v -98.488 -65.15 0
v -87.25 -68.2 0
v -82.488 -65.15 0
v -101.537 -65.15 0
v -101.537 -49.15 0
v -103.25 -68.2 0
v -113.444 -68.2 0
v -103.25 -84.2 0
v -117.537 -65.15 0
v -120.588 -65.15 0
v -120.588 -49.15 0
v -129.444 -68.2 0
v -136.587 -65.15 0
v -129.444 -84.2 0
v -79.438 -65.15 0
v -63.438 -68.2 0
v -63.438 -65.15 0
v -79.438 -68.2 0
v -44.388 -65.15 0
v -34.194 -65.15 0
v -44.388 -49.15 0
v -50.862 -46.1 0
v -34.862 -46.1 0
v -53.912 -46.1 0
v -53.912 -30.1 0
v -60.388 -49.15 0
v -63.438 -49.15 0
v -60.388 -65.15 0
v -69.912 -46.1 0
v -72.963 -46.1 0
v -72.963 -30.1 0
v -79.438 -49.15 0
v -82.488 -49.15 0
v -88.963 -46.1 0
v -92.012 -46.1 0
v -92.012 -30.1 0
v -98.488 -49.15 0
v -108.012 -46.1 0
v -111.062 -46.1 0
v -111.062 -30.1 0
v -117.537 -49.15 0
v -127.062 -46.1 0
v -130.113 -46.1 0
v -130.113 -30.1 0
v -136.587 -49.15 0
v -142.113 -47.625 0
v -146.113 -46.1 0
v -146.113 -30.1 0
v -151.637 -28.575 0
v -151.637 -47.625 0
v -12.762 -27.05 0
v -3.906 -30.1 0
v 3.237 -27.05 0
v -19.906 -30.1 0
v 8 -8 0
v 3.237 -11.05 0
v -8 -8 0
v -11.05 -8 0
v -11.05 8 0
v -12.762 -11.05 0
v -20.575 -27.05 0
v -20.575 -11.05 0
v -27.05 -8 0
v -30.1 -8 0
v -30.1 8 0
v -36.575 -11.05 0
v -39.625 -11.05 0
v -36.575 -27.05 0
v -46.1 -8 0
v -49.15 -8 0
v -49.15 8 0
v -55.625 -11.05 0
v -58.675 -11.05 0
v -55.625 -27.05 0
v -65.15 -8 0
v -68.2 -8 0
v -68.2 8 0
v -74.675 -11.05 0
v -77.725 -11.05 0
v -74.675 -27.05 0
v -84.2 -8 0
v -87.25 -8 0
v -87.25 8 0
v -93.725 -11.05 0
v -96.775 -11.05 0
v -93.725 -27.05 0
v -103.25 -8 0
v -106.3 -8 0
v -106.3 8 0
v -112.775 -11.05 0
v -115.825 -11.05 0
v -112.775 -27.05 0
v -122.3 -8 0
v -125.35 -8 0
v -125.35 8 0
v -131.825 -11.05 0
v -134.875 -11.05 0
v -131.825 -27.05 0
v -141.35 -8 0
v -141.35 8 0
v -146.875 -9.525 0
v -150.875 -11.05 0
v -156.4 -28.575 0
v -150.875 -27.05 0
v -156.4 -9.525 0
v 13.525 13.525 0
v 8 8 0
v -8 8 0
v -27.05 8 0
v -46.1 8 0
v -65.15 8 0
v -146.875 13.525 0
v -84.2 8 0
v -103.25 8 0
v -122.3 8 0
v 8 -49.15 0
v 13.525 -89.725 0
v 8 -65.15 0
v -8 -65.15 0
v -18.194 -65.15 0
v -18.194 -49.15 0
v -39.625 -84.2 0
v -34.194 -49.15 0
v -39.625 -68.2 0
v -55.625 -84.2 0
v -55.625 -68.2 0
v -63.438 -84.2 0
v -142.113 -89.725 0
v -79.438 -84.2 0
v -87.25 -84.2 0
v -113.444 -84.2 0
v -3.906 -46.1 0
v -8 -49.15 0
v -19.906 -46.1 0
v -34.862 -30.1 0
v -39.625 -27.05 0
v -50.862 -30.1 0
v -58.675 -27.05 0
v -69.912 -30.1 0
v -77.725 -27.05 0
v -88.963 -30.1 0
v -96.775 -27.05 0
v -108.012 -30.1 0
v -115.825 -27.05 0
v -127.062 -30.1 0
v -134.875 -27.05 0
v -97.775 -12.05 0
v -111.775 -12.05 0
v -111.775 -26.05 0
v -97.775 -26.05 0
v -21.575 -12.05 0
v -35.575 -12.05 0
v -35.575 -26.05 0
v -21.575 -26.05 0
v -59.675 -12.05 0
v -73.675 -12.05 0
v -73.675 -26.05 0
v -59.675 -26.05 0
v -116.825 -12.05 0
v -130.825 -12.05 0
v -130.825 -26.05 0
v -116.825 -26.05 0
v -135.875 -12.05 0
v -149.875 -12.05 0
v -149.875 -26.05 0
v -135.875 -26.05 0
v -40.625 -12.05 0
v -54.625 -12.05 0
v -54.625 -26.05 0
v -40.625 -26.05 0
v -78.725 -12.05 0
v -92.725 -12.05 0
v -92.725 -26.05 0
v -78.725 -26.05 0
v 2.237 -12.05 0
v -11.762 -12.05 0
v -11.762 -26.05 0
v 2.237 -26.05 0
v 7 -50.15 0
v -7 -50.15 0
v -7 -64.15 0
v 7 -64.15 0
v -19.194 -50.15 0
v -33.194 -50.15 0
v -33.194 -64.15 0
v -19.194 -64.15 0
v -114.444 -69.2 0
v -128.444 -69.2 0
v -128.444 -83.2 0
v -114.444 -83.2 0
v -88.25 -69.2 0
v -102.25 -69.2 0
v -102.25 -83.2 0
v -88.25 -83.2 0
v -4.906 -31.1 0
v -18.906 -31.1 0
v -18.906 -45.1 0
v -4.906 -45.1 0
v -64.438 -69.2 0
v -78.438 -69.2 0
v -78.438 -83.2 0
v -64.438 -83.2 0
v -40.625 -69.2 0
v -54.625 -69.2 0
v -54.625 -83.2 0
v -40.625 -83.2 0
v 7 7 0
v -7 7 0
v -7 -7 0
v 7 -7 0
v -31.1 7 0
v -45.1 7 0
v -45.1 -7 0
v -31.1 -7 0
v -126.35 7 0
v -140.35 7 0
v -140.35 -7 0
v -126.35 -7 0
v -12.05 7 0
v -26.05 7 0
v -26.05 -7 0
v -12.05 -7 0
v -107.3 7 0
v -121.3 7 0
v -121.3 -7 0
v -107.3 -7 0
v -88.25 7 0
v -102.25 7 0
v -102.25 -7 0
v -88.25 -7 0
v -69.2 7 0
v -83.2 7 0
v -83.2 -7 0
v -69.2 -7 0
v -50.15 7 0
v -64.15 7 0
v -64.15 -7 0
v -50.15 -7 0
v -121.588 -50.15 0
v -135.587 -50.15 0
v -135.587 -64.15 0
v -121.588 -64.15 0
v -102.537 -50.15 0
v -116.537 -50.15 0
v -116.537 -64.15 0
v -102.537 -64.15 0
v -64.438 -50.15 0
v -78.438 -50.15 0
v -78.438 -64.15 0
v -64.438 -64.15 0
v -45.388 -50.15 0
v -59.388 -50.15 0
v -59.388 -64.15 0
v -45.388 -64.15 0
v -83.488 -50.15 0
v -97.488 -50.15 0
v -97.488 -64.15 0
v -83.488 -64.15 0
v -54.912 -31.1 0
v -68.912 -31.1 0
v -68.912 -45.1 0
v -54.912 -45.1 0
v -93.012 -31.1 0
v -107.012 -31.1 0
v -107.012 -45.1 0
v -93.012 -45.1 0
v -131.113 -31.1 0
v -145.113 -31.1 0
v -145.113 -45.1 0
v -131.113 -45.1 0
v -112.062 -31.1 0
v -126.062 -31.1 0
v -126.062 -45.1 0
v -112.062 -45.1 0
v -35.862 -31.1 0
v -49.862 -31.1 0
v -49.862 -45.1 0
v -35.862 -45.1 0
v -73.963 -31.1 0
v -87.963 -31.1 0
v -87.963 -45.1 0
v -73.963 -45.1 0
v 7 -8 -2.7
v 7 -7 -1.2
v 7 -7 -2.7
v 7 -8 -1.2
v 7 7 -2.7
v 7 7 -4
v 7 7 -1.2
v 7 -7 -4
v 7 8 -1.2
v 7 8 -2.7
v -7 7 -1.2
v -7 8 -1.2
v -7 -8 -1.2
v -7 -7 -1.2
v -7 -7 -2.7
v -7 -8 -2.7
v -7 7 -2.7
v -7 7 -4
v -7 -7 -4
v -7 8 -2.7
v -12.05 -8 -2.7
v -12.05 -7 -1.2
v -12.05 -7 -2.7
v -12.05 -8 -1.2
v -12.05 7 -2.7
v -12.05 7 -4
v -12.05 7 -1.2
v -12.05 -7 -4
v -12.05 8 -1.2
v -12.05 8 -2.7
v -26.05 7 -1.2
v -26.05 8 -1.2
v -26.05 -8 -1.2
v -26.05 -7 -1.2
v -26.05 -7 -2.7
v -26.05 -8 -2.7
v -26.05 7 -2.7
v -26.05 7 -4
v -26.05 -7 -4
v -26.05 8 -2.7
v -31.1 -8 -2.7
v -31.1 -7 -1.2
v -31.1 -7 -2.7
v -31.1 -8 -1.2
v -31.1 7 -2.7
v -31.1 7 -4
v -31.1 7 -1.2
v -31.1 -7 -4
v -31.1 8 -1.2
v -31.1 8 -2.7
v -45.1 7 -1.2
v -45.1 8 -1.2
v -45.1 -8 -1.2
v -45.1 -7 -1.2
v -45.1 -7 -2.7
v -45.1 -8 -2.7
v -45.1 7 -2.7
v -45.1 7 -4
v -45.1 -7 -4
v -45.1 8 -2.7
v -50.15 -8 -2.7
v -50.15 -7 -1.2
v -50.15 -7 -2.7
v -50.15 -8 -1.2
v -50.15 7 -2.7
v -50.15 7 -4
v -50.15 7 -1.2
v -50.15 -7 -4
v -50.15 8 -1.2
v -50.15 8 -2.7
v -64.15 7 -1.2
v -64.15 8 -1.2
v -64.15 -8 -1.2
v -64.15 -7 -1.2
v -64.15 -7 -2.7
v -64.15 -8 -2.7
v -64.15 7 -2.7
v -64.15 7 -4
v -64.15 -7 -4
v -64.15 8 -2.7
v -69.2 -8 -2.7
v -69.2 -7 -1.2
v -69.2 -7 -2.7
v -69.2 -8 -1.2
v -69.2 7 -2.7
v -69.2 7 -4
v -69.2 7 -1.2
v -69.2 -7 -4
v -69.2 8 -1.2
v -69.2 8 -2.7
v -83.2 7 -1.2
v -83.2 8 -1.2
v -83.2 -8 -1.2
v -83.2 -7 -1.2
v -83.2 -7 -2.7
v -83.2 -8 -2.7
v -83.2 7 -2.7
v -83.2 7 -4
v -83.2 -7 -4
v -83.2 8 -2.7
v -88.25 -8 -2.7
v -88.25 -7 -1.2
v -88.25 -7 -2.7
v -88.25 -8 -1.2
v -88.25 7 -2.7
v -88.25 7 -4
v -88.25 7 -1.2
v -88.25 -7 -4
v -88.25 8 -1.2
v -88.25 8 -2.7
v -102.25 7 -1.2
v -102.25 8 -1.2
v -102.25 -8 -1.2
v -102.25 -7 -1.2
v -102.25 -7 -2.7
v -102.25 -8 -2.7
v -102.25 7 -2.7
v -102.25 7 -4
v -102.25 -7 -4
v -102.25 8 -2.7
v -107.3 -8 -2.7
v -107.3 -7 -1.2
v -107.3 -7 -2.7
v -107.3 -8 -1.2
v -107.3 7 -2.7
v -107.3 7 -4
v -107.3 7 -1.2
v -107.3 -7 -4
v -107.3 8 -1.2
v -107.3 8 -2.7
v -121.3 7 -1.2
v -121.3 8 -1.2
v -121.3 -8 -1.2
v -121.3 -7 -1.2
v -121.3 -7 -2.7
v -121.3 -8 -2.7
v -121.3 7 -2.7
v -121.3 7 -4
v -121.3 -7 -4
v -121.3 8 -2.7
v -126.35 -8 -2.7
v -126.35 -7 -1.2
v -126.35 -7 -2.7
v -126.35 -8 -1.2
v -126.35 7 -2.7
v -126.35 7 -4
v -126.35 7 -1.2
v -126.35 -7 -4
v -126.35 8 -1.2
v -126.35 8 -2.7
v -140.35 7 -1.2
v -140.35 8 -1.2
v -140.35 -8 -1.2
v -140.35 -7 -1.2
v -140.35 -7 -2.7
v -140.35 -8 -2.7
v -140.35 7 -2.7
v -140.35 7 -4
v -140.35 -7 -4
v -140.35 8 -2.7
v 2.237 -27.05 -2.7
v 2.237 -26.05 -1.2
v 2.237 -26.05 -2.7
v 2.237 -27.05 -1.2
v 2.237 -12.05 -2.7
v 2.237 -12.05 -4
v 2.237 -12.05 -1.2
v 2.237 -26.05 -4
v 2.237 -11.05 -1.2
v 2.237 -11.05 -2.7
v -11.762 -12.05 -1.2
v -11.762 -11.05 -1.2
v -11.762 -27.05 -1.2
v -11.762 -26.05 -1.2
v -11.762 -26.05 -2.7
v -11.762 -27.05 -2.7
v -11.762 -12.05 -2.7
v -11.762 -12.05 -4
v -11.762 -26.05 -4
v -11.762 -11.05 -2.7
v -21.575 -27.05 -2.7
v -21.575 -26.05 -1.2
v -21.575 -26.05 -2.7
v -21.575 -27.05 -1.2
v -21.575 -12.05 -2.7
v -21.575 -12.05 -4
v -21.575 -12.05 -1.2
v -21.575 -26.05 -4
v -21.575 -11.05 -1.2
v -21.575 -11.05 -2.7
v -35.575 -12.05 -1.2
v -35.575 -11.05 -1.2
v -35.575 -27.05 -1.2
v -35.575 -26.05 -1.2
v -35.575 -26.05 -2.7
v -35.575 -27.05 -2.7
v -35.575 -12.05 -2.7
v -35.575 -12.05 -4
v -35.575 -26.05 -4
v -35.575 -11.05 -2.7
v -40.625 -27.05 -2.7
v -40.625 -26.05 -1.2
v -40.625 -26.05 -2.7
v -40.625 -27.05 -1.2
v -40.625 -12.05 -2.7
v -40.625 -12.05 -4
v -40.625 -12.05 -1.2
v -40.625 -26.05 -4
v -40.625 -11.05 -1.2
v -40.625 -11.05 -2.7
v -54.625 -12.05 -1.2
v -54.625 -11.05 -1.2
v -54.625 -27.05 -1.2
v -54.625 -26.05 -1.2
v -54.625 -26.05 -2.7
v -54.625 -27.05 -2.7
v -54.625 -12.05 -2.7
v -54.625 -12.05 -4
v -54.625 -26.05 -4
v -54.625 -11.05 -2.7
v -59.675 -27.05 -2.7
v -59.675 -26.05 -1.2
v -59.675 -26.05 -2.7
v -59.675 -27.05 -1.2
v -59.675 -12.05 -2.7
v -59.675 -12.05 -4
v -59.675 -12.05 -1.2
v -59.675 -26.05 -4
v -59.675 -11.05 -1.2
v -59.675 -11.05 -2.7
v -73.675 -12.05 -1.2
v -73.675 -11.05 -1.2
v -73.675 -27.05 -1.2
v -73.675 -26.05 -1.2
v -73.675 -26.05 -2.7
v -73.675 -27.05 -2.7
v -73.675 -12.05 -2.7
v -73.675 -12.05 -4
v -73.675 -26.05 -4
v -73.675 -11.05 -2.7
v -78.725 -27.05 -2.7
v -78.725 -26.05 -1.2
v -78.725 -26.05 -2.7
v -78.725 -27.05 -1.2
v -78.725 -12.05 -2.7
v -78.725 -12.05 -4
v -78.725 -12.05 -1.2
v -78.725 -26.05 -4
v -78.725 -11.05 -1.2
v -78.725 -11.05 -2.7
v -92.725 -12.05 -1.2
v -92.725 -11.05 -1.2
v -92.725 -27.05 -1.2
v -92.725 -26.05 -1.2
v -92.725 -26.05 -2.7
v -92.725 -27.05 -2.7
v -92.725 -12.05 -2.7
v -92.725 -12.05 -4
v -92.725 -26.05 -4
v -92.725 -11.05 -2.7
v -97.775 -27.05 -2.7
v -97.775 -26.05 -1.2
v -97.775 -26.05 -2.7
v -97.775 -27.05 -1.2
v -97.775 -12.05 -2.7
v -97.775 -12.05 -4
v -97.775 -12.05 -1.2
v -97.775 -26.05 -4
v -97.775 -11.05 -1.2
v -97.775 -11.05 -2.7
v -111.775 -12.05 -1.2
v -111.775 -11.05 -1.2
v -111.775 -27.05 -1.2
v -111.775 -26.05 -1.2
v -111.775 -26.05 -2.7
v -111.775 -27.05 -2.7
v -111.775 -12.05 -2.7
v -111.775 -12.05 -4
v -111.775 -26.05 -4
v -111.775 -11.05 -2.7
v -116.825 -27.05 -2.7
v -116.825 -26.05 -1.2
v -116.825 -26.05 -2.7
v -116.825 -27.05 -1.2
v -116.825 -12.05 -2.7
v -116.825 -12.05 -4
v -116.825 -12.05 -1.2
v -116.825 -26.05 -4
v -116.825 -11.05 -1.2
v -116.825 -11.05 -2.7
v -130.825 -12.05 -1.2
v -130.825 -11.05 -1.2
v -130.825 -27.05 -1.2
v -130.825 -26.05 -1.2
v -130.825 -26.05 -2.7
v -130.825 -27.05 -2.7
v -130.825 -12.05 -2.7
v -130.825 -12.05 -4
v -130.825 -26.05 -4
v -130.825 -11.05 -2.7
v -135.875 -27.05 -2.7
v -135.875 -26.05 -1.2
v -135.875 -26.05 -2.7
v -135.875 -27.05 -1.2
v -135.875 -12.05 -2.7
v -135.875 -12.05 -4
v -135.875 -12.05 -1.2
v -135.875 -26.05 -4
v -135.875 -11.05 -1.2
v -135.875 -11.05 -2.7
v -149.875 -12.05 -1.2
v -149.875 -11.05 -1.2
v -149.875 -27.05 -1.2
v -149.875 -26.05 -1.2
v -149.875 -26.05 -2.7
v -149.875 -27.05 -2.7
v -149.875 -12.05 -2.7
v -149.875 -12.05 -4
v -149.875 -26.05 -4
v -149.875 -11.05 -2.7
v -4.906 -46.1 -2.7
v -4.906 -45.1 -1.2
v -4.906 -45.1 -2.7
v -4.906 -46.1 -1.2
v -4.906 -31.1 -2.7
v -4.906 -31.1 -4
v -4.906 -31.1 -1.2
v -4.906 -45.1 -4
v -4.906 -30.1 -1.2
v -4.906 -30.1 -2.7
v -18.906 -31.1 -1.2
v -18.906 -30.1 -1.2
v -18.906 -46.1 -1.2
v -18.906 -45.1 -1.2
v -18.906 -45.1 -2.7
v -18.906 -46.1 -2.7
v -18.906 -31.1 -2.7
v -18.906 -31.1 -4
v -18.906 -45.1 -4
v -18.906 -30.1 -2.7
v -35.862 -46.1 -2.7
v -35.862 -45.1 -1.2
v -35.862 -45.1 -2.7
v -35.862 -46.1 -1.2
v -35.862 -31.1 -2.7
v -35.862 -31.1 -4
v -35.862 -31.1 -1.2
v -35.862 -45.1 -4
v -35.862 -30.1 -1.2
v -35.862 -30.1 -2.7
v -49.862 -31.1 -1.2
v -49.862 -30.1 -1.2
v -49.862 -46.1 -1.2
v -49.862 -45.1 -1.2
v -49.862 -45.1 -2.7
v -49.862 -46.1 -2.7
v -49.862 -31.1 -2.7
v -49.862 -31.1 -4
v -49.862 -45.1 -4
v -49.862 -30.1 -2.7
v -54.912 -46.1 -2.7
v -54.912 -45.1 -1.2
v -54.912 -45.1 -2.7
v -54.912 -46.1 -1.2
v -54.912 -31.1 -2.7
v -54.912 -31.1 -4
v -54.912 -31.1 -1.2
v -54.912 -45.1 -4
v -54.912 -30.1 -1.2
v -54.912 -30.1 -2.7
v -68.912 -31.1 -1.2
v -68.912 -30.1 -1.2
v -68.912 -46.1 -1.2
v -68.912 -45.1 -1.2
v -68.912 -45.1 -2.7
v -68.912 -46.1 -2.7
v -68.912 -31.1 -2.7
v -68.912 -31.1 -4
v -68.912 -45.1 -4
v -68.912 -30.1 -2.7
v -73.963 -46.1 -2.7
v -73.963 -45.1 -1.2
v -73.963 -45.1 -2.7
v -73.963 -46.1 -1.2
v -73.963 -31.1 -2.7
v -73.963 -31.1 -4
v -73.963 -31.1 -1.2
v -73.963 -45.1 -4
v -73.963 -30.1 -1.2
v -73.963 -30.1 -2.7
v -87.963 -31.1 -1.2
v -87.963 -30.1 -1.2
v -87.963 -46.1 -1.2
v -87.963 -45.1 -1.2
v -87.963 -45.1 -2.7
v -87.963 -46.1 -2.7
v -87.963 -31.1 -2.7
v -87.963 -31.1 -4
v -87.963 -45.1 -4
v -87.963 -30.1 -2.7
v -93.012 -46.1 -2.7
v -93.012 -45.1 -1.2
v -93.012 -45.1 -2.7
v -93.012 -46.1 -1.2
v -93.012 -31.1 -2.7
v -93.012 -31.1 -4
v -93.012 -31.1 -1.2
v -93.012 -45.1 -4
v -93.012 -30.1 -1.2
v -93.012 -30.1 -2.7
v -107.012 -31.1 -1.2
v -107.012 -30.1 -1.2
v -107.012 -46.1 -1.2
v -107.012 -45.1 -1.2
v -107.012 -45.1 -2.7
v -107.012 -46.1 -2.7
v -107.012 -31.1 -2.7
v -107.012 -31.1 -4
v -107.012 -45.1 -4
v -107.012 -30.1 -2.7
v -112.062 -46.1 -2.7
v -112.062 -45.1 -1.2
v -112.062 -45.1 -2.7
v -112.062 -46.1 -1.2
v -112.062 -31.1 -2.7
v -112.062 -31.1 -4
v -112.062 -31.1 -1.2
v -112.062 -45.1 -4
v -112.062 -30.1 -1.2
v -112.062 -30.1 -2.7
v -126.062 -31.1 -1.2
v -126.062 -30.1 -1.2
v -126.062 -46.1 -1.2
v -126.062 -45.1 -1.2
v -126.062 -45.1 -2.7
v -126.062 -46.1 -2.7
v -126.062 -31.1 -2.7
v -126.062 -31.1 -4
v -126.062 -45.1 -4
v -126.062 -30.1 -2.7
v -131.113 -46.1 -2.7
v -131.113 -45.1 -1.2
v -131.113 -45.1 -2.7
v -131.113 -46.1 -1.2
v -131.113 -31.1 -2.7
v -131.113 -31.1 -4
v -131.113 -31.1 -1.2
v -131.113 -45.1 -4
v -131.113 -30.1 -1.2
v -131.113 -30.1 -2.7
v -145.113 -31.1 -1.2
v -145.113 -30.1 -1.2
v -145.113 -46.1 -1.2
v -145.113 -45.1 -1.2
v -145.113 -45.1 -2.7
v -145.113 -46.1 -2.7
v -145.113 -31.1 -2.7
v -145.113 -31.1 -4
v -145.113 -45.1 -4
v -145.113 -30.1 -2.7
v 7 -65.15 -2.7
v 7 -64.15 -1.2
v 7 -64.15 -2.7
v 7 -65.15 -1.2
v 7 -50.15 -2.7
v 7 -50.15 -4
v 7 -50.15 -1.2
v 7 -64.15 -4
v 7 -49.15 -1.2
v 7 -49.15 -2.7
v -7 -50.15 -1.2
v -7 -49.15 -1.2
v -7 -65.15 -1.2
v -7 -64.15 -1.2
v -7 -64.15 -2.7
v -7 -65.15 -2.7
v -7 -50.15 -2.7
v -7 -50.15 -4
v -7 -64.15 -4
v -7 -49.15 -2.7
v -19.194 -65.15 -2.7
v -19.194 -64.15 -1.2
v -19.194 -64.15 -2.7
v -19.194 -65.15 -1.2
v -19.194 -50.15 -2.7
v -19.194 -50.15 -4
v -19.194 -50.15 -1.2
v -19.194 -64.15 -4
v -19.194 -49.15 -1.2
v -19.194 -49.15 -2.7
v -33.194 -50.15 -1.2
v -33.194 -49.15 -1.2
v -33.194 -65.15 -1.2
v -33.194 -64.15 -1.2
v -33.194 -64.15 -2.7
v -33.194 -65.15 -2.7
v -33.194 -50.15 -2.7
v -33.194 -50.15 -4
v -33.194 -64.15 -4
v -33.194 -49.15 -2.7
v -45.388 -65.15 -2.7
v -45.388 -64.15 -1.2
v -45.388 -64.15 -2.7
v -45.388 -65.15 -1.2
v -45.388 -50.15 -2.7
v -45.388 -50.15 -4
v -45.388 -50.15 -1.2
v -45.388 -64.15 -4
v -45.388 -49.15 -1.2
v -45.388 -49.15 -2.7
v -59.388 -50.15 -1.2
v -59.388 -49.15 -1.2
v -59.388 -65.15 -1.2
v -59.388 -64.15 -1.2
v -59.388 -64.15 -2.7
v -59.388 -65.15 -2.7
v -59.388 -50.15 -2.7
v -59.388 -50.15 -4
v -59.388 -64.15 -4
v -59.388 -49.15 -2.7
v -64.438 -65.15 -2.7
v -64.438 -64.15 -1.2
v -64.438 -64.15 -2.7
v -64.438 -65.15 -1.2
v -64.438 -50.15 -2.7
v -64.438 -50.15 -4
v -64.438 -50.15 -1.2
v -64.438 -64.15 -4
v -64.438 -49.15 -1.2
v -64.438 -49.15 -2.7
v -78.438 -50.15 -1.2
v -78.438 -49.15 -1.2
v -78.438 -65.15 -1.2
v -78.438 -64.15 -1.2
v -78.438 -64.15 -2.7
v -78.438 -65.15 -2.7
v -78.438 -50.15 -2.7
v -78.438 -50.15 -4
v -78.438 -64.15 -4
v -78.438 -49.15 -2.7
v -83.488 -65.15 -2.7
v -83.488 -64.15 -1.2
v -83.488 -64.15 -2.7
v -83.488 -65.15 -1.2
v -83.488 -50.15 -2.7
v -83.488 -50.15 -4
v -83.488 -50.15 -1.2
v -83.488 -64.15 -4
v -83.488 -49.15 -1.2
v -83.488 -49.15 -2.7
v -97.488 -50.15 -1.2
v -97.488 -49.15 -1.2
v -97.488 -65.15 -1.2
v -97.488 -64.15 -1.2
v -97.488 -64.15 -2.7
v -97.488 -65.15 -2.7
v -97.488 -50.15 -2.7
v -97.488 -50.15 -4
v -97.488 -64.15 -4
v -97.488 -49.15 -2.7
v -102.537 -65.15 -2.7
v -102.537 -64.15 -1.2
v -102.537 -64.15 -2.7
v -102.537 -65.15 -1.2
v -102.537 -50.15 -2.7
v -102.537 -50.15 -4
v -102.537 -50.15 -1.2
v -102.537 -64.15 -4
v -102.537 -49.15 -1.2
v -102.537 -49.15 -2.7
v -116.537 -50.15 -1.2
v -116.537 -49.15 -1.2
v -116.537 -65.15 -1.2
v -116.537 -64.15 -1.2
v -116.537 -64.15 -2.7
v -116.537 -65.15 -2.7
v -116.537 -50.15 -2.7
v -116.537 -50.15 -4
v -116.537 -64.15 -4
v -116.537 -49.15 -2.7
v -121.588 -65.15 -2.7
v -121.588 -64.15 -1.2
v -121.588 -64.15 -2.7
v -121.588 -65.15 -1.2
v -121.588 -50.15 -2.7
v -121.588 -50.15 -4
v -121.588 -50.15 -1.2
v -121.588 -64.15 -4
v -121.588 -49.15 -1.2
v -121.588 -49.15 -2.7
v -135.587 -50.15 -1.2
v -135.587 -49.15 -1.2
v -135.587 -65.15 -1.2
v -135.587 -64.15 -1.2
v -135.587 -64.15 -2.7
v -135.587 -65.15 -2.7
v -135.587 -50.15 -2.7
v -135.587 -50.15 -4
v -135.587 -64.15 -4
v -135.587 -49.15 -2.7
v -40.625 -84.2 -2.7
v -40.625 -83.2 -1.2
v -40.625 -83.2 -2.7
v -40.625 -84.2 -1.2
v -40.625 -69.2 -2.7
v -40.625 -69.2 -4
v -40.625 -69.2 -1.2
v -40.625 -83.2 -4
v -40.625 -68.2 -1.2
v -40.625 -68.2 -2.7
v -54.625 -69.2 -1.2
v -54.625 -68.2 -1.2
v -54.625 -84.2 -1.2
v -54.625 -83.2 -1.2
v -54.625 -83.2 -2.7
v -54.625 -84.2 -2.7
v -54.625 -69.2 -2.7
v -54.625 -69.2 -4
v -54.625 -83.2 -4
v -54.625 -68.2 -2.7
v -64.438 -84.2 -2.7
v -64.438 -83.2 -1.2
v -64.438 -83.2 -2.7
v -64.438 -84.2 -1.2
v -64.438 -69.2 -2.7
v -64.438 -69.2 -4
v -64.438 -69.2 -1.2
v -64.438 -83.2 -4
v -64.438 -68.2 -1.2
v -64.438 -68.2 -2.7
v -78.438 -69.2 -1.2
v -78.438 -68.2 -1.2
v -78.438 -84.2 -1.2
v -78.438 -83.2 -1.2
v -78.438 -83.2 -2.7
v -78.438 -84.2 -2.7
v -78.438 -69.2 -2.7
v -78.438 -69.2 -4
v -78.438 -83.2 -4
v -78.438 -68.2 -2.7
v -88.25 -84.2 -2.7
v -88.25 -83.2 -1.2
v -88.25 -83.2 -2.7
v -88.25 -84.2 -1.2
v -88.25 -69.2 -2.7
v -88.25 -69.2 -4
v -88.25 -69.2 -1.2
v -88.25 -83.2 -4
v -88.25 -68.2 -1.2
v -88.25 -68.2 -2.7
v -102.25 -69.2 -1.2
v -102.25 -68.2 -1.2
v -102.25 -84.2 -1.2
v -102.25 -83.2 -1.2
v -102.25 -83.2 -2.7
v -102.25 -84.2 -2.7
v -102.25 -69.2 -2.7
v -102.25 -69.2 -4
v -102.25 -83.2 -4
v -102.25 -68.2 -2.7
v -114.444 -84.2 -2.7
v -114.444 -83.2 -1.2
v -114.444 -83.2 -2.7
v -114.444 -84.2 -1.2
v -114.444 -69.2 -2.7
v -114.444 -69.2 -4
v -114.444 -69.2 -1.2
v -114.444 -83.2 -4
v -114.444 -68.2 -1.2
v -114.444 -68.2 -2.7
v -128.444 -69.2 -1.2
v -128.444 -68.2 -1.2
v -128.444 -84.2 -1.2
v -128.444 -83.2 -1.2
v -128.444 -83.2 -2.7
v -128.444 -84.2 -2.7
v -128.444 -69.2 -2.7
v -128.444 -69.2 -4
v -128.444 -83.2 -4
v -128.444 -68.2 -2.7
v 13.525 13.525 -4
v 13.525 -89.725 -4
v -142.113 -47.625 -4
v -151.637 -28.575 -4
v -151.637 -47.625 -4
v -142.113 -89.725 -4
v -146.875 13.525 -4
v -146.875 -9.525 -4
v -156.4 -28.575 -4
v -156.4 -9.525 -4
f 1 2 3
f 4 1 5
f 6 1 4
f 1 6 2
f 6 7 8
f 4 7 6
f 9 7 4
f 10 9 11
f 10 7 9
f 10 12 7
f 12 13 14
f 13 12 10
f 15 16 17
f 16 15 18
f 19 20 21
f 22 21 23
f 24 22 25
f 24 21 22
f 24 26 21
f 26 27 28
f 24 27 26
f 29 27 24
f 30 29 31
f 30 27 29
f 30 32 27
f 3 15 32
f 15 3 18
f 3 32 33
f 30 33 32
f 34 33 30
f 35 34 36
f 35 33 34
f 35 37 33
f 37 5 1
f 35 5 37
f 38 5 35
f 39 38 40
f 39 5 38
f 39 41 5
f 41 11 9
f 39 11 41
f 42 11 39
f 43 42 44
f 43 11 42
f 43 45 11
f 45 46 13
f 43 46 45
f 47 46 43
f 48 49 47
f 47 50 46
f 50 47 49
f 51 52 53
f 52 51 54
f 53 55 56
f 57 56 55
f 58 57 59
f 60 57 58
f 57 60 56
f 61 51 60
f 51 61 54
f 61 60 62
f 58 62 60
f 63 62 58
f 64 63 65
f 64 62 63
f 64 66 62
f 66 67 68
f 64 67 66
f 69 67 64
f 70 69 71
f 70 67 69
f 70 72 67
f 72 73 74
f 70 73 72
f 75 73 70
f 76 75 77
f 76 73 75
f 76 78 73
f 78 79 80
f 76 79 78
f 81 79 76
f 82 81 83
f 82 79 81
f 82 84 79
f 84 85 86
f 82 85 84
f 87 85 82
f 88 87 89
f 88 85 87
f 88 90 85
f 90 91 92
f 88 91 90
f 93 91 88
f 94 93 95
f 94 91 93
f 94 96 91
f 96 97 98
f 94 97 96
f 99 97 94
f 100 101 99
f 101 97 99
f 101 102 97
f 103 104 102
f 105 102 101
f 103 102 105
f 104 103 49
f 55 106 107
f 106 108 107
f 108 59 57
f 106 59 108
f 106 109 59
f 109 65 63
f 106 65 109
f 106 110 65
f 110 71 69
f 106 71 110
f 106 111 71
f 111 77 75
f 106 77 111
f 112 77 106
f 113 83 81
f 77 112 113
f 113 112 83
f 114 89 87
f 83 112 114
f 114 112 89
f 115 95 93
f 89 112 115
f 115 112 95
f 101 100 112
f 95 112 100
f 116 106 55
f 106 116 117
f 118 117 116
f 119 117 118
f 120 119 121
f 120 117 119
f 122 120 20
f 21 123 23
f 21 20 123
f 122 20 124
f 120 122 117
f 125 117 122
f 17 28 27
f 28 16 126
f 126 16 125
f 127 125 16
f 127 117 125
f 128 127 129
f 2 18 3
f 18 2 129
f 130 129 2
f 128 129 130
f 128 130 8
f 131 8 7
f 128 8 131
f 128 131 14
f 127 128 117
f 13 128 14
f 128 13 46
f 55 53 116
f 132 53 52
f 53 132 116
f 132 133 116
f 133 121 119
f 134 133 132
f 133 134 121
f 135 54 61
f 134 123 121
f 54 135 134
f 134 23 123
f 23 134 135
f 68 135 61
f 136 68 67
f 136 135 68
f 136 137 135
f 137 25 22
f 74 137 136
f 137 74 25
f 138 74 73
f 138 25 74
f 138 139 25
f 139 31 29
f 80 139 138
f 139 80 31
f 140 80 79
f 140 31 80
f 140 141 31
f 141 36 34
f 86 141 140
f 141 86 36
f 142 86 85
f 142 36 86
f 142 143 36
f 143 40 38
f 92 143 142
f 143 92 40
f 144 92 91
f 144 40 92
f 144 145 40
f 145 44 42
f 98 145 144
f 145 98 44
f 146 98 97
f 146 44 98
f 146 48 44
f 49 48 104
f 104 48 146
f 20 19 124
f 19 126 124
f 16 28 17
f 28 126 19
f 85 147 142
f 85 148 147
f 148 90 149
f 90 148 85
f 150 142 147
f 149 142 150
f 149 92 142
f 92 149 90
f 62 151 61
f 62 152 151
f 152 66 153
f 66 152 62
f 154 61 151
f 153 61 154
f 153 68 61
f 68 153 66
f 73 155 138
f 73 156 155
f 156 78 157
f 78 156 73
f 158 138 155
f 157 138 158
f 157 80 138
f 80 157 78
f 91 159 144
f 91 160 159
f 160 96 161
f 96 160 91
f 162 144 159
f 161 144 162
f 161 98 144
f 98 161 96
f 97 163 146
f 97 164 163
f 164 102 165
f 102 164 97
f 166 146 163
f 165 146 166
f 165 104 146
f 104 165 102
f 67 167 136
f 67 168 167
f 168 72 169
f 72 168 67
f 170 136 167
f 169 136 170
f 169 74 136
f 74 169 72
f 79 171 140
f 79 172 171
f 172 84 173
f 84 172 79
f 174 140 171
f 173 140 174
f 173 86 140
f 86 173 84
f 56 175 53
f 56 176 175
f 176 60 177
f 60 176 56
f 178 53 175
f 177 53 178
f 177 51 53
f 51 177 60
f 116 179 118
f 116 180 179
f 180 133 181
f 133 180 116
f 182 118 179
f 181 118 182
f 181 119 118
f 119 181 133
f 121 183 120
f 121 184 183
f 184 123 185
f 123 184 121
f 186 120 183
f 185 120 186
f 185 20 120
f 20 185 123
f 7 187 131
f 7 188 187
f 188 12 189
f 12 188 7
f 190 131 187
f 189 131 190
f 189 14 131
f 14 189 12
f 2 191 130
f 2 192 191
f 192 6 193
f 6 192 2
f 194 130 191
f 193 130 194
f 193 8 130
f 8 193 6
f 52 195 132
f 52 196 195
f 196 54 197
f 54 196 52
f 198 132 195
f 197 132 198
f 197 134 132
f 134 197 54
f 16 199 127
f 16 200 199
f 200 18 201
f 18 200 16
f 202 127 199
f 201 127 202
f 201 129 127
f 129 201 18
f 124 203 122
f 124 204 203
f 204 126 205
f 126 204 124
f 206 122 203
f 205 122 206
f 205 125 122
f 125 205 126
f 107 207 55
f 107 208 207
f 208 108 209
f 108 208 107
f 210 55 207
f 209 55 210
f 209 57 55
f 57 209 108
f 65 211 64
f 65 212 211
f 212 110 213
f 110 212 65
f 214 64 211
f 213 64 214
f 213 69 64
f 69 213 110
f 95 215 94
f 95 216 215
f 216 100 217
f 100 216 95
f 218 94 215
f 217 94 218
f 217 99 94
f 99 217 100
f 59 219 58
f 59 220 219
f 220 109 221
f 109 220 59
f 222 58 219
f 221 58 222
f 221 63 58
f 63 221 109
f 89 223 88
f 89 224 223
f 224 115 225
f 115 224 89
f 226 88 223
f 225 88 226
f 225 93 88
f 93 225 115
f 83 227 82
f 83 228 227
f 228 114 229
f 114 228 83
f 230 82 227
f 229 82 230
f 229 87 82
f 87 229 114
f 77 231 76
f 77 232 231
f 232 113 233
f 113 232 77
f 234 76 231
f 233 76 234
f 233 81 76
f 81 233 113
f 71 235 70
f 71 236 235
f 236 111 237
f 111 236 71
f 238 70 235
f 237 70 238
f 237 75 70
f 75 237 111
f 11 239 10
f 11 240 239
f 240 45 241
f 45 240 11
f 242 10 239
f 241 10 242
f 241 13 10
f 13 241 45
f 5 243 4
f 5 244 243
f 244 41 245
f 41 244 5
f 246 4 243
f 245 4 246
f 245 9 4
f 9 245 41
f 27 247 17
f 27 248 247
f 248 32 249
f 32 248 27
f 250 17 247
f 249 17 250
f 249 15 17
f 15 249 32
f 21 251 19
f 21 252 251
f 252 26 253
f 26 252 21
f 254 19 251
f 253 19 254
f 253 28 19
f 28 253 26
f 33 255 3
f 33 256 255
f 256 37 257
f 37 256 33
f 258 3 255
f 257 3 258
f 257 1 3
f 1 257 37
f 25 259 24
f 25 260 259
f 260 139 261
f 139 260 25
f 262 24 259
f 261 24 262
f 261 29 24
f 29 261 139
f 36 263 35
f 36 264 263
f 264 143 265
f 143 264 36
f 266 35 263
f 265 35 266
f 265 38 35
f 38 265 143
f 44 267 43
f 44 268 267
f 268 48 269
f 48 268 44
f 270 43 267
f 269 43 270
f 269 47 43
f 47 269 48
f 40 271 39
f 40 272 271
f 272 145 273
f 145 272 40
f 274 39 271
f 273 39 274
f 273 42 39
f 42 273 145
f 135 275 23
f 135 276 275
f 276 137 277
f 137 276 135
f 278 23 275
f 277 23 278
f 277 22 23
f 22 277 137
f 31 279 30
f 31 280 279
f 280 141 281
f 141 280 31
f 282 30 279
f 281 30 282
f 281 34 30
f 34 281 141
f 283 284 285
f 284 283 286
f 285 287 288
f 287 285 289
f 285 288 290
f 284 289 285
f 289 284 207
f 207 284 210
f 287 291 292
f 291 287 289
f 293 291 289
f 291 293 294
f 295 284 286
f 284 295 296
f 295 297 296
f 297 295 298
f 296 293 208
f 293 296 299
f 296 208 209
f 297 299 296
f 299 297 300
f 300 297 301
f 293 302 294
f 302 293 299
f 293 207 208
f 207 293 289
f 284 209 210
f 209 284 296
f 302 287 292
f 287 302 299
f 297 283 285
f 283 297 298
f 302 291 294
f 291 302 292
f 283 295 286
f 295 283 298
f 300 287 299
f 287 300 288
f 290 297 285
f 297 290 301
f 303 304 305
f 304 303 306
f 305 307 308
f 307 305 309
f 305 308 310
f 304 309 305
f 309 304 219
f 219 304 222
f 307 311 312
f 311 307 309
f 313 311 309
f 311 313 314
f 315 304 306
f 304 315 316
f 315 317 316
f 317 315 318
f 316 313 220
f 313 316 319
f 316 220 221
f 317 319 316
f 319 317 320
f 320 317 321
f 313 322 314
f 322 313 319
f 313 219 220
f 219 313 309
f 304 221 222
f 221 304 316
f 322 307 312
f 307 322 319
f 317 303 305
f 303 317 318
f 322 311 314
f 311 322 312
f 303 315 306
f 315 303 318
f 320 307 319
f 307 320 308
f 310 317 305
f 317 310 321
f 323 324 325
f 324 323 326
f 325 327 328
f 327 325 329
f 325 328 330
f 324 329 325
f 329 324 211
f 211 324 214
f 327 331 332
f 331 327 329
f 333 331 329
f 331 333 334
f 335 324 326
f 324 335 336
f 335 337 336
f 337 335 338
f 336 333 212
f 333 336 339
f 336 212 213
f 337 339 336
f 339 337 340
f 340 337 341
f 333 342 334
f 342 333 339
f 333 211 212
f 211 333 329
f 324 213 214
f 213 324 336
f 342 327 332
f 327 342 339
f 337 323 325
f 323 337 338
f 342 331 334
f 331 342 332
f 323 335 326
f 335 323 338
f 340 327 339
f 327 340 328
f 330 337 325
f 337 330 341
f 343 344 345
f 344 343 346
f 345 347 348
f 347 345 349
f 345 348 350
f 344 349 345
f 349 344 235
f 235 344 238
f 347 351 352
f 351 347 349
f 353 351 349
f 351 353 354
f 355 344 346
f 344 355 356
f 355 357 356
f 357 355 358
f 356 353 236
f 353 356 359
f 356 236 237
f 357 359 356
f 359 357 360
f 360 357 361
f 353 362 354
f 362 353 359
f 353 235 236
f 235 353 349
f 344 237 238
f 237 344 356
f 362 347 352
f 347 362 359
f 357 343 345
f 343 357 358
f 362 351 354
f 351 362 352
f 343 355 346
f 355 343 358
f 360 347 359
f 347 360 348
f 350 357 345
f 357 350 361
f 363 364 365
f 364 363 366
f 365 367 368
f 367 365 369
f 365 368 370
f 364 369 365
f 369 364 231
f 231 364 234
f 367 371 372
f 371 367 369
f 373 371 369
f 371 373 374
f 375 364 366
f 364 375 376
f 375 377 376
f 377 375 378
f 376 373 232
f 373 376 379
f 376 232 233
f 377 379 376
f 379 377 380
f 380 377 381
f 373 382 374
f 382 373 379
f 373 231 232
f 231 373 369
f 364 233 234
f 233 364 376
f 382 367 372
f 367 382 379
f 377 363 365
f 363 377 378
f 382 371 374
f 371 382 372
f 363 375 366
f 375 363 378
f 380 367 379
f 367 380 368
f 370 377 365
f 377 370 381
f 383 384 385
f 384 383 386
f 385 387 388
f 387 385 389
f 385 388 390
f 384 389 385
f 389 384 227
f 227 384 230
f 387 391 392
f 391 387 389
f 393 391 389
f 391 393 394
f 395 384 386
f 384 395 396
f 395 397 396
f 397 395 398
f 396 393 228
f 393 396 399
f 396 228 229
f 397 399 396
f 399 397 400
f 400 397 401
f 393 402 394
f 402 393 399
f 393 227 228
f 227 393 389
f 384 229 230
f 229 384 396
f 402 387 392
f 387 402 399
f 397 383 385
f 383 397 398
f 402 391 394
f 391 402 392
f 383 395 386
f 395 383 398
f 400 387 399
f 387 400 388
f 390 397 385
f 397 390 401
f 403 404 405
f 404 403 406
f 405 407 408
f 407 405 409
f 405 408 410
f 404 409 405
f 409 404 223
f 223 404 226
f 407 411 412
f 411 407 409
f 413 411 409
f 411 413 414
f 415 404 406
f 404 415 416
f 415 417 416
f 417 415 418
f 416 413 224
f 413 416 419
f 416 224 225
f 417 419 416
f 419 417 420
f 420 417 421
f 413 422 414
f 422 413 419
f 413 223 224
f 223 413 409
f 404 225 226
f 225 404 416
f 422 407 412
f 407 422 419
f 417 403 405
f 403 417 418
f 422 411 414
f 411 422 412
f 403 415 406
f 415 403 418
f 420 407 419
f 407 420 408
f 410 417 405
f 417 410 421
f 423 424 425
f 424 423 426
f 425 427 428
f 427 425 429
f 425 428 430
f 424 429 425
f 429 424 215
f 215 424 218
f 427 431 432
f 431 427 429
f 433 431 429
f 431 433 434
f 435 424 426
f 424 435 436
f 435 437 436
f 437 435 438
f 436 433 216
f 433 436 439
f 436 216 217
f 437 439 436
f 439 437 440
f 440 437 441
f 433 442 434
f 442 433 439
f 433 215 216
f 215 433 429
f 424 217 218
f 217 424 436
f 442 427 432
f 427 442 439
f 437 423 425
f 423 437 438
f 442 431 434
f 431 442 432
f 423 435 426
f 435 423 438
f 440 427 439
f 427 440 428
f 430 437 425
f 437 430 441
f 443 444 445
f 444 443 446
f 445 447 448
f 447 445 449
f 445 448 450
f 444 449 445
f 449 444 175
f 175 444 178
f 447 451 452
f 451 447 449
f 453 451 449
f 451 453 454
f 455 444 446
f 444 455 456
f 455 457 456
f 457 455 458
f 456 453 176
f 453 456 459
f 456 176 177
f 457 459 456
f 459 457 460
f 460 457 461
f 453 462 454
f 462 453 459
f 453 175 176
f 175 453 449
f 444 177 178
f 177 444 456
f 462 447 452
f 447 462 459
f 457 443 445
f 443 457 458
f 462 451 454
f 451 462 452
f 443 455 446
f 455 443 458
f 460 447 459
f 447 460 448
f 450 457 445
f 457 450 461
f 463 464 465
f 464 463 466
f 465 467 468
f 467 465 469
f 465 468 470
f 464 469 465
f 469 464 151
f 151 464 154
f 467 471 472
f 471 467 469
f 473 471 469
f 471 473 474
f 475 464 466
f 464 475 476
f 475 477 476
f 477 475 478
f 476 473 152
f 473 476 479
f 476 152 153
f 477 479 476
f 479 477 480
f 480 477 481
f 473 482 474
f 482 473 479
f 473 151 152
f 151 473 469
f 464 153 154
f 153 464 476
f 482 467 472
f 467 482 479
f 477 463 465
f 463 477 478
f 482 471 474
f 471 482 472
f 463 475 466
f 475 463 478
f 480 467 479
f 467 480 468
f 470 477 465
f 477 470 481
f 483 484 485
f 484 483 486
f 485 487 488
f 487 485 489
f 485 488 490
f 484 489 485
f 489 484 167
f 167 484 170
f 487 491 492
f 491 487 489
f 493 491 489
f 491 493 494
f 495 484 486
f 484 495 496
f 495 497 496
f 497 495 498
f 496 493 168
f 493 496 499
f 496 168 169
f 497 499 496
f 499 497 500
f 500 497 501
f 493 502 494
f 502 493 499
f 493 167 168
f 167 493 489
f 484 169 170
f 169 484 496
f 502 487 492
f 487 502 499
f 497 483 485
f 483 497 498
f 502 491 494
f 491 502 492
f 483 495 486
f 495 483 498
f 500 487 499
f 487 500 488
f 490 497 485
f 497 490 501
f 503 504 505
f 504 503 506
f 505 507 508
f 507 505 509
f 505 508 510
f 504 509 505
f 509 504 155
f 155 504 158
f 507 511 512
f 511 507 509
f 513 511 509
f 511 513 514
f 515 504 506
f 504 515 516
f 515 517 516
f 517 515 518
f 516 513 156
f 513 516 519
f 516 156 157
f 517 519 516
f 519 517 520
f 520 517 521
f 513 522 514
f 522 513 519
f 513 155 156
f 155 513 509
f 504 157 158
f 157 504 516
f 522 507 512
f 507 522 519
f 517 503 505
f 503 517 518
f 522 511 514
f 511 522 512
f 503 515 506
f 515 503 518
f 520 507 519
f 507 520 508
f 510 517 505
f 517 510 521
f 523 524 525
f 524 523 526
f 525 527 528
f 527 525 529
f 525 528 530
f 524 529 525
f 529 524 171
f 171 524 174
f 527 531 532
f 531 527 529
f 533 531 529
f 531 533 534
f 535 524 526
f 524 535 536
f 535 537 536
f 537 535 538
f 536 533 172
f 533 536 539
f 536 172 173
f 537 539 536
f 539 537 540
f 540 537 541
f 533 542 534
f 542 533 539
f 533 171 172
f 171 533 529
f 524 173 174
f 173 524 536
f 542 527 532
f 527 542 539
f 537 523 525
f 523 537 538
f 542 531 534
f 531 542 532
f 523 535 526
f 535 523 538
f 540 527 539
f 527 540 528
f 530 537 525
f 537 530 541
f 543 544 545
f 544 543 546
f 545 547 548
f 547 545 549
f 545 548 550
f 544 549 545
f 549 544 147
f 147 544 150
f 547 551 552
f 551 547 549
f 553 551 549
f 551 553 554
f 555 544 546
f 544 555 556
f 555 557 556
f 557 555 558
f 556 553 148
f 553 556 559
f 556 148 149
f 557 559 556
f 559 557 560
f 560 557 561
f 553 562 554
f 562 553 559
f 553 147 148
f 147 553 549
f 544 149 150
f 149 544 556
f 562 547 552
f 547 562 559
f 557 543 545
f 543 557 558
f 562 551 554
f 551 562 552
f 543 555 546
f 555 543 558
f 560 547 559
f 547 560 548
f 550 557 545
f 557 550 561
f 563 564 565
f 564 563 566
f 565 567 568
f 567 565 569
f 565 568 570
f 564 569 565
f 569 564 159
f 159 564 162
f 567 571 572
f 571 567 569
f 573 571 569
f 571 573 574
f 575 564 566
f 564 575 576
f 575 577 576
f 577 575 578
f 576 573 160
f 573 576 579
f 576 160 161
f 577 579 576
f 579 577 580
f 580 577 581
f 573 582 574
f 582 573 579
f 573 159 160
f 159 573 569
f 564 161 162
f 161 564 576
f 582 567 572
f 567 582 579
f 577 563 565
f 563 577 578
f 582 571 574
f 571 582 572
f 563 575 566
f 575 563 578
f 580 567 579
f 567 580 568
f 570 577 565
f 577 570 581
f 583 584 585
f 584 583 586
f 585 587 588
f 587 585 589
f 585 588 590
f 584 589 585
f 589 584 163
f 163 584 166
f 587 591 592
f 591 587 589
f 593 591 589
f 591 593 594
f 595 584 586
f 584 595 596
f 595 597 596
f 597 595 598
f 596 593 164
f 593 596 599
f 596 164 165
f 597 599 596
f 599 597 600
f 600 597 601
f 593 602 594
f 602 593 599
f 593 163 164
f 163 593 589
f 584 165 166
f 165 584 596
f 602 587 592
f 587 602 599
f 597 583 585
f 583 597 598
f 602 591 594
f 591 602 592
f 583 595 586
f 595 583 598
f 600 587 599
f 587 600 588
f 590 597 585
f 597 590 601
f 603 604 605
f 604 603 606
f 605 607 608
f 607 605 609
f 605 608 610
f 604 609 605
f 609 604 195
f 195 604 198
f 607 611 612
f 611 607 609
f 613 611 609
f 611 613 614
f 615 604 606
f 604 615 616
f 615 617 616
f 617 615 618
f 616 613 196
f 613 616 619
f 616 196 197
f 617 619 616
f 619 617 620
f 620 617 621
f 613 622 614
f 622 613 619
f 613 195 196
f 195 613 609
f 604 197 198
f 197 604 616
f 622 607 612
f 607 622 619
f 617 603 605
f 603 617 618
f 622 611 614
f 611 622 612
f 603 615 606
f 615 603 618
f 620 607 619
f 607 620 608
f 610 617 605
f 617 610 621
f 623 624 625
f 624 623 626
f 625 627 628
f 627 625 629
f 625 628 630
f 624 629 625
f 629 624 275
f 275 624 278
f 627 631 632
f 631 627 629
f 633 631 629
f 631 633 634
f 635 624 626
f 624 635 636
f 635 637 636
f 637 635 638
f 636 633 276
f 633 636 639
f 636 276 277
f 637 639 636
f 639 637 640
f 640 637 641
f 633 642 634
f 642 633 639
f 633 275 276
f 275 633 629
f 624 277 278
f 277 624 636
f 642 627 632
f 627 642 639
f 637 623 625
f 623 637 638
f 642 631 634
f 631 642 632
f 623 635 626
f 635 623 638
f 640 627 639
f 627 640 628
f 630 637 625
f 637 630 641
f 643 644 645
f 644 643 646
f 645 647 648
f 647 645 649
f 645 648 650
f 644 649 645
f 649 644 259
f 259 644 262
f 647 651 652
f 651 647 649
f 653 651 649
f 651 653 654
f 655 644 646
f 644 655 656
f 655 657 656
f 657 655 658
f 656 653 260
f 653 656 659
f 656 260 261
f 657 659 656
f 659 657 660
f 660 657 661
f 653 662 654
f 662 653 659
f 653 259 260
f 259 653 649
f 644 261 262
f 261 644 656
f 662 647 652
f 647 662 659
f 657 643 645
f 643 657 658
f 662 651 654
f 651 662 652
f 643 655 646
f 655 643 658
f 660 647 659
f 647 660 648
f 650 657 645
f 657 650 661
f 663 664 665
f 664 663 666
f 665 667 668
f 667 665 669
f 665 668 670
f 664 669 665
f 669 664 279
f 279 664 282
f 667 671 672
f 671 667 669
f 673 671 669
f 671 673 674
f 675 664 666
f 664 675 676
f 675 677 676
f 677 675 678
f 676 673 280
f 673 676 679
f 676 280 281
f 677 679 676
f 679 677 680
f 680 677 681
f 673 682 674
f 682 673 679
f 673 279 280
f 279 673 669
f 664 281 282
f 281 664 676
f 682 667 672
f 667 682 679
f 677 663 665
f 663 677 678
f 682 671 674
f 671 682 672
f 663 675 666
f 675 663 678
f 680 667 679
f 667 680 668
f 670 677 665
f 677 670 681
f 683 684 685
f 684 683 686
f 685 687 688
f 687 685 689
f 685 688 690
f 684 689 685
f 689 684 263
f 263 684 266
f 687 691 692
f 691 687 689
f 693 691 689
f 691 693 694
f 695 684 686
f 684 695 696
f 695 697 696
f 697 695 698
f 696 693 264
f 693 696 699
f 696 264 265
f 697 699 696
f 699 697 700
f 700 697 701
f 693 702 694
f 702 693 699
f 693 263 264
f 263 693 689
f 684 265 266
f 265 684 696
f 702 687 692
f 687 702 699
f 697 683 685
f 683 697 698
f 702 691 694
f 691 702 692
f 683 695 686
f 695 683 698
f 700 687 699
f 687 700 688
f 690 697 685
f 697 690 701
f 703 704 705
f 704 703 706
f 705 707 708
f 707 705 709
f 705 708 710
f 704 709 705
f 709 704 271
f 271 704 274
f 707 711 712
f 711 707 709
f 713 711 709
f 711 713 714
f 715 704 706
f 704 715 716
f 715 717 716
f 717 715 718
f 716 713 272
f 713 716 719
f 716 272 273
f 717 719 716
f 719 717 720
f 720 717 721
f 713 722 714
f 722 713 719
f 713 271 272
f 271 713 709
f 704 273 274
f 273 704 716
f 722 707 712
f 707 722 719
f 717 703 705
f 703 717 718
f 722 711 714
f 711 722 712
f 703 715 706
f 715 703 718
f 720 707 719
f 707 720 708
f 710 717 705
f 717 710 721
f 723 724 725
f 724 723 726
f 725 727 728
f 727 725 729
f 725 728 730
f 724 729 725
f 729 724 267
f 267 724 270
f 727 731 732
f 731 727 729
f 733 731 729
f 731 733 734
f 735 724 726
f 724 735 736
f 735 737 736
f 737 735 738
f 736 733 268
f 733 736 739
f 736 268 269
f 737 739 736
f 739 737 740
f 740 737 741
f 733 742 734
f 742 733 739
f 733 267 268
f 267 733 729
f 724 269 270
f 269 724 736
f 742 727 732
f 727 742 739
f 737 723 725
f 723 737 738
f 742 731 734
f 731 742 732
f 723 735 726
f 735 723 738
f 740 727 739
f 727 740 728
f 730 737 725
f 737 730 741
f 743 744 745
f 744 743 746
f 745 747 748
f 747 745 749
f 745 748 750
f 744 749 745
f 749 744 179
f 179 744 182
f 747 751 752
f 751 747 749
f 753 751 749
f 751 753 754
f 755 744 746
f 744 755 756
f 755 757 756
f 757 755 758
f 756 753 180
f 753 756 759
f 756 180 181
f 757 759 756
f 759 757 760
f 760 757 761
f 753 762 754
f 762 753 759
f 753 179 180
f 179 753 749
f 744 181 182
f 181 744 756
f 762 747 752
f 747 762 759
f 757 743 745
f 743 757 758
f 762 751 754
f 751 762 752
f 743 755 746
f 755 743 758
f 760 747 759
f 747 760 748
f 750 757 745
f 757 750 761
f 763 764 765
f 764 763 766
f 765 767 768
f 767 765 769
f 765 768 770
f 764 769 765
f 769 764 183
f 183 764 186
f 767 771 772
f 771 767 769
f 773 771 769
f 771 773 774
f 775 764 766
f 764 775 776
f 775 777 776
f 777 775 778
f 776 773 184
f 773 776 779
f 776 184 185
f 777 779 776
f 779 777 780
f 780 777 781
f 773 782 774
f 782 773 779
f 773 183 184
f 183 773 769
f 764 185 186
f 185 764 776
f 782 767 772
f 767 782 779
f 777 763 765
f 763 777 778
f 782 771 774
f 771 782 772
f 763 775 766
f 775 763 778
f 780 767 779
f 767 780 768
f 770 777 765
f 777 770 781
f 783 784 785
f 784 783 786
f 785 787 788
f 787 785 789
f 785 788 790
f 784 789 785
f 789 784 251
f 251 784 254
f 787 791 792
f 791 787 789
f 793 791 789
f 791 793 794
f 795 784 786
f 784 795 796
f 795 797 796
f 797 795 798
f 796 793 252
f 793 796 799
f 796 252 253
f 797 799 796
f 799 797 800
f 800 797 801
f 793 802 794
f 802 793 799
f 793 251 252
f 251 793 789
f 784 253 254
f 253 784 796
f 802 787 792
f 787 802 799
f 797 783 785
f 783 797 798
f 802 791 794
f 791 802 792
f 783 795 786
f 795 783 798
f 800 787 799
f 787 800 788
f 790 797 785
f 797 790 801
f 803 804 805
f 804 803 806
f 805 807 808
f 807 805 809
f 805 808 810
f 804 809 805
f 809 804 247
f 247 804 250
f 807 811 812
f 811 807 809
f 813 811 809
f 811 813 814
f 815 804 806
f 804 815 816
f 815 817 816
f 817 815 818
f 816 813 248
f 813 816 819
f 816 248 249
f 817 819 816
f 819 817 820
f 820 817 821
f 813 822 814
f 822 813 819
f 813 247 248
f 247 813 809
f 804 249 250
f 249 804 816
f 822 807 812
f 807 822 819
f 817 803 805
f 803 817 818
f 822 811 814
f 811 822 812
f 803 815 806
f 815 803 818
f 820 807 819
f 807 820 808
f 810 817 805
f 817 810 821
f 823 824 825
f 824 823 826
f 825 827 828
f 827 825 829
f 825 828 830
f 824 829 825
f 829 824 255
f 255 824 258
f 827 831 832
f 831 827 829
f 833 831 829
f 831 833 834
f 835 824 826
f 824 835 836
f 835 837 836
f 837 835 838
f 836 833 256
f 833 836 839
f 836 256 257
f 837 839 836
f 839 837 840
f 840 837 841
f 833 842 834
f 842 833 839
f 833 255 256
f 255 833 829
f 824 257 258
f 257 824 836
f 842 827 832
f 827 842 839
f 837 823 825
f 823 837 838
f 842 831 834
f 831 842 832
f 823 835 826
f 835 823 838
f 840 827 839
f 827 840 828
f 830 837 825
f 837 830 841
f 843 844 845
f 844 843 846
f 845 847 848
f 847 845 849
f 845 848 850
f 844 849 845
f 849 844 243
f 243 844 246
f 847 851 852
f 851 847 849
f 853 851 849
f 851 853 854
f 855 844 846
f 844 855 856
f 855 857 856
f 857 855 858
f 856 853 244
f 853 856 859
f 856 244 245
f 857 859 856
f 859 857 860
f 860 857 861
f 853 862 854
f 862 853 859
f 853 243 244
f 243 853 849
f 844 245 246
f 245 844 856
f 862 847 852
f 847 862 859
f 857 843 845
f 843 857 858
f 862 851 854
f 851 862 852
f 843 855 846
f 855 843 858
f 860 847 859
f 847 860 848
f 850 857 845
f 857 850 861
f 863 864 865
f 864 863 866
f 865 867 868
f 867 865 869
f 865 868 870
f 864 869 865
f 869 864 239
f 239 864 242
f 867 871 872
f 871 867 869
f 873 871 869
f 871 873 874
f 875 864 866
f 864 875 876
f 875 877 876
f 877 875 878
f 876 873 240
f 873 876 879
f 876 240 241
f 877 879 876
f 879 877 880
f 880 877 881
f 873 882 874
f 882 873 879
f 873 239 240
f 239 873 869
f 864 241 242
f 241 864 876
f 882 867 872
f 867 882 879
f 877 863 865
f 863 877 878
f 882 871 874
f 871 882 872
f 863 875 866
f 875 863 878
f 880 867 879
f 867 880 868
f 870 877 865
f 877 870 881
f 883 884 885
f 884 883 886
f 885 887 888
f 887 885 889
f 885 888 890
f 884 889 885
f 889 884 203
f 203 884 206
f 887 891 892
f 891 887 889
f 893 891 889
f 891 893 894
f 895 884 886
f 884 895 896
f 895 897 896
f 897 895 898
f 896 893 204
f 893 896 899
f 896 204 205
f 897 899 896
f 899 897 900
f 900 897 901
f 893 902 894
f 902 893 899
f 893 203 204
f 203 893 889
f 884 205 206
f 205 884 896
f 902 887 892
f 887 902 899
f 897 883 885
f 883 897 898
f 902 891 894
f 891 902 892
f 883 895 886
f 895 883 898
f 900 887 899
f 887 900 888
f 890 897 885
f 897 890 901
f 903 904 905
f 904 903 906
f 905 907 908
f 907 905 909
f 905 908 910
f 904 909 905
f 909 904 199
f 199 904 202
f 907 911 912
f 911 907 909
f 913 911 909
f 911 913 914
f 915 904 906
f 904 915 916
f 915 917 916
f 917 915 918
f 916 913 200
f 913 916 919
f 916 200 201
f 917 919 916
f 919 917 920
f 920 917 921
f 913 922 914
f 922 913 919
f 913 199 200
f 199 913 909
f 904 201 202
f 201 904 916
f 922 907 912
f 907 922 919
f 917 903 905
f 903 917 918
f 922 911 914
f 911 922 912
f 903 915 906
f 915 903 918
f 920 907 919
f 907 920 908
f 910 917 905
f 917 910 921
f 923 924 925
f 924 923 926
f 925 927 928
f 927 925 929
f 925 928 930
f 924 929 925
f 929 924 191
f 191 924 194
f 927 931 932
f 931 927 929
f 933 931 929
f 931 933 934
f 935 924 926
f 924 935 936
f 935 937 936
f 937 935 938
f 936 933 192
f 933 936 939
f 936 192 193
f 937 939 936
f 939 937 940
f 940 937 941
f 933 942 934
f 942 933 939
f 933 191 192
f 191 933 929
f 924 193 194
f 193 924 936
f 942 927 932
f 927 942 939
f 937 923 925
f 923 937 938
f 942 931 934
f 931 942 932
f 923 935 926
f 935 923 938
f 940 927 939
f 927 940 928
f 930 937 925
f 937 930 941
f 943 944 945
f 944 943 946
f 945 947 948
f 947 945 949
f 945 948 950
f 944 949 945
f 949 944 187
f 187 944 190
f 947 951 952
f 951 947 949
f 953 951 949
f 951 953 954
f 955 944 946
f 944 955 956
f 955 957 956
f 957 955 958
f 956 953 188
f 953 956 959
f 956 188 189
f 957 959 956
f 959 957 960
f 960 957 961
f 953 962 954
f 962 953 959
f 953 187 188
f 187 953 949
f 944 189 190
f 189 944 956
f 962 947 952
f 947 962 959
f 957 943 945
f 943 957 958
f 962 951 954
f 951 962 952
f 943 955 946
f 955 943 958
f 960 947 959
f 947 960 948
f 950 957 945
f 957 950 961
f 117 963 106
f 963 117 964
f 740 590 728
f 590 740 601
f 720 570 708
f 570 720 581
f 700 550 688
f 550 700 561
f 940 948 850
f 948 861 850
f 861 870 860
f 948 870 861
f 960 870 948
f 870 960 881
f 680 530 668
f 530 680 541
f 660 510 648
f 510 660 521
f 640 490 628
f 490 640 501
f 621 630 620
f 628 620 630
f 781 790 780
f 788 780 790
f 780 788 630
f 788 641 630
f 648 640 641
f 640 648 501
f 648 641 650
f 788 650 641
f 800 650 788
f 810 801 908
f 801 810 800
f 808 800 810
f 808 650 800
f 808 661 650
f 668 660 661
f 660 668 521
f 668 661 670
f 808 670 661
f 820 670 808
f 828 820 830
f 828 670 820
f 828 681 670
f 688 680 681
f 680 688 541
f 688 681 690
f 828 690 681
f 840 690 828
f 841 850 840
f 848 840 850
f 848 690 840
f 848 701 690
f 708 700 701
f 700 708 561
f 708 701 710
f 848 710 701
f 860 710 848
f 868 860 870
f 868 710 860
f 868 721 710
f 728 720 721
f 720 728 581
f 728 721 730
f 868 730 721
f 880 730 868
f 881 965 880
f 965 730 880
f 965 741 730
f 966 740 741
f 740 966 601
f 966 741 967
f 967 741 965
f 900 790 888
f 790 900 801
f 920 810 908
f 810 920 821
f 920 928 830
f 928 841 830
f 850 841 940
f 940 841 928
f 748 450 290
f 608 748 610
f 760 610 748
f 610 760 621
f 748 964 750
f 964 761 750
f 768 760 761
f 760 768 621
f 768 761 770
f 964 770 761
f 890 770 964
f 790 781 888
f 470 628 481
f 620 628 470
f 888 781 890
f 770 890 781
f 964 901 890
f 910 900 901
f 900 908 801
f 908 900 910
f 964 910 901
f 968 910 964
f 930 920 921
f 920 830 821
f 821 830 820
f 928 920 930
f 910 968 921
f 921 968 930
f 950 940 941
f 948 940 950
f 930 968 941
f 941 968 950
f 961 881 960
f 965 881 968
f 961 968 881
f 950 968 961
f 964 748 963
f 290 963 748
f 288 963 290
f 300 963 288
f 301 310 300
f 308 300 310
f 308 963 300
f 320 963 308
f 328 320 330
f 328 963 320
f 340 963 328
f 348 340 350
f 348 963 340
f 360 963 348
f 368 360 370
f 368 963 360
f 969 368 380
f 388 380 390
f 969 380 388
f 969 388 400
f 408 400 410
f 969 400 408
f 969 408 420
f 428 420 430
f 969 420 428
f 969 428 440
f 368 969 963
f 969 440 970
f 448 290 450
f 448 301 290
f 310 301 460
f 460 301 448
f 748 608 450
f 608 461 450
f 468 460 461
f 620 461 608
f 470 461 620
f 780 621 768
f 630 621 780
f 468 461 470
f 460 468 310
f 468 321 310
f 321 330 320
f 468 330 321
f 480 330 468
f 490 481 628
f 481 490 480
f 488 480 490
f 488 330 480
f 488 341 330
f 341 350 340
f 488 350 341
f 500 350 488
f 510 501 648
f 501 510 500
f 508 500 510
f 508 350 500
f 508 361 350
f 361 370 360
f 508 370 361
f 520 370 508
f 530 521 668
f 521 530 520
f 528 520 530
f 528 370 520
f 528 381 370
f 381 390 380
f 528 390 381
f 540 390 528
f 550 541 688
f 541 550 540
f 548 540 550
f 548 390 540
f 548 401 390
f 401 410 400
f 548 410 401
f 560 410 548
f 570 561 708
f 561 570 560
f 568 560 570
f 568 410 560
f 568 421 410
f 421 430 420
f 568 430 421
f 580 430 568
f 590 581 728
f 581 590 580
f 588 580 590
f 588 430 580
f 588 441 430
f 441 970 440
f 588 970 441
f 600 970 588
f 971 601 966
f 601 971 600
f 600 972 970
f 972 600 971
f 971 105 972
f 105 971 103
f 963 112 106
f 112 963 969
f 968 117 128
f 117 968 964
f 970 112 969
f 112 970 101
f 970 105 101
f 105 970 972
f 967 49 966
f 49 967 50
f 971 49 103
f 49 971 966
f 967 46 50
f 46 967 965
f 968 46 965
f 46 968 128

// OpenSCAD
// file: key_switch.scad
key_switch(0, 0);

module key_switch(x, y) {
    union() {
        h1 = 2;
        translate([x, y, h1 / 2]) {
            cube([16, 16, h1], center=true);
        }
        h2 = 5;
        translate([x, y, h1 + h2 / 2]) {
            cube([16, 16, h2], center=true);
        }
        h3 = 1.2;
        translate([x, y, -h3 / 2]) {
            cube([14, 14, h3], center=true);
        }
        h4 = 1.5;
        translate([x, y, -h3 - h4 / 2]) {
            cube([14, 16, h4], center=true);
        }
        h5 = 10;
        translate([x, y, -h3 - h4 - h5 / 2]) {
            cube([14, 14, h5], center=true);
        }
        key_cap(x, y);
    }
}

module key_cap(x, y) {
    wx1 = 18;
    dx1 = wx1 / 2;

    wy1 = 18;
    dy1 = wy1 / 2;

    wx2 = 12;
    dx2 = wx2 / 2;

    wy2 = 13;
    ry2 = 0.6; // should be greater than 0.5

    z1 = 7;

    z2 = z1 + 10;

    points = [
    [x + dx1, y + dy1, z1], // 0
    [x + dx1, y - dy1, z1], // 1
    [x - dx1, y + dy1, z1], // 2
    [x - dx1, y - dy1, z1], // 3
    [x + dx2, y + ry2 * wy2, z2], // 4
    [x + dx2, y - (1 - ry2) * wy2, z2], // 5
    [x - dx2, y + ry2 * wy2, z2], // 6
    [x - dx2, y - (1 - ry2) * wy2, z2] // 7
    ];
    
    // "All faces must have points ordered in the same direction . OpenSCAD prefers clockwise when looking at each face from outside inwards (from OpenSCAD User Manual/Primitive Solids)"
    faces = [
        [0, 2, 3, 1], // bottom
        [0, 1, 5, 4], // right
        [1, 3, 7, 5], // front
        [3, 2, 6, 7], // left
        [2, 0, 4, 6], // back
        [4, 5, 7, 6]  // top
    ];
    
    polyhedron(points, faces);
}
// main file
use <key_switch.scad>

w = 19.05; // unit width

padding_x_l = 4; // padding x left 
padding_x_r = 4; // padding x right
padding_y_t = 4; // padding y top
padding_y_b = 4; // padding y bottom

y1 = 0;      // row1
y2 = -w;     // row2
y3 = -2 * w; // row3
y4 = -3 * w; // row4
y5 = -4 * w; // row5

difference() {    
    set_plate();
    set_key_switches();
    unit_cube(-8 * w - padding_x_l, y1 + w);
    unit_cube(-8 * w - padding_x_l, y1);
    unit_cube(-(2.25 + 6) * w - padding_x_l, y3);
    unit_cube(-(2.75 + 5) * w - padding_x_l, y4);
    unit_cube(-(2.75 + 5) * w -padding_x_l, y5);
    unit_cube(-(2.75 + 5) * w -padding_x_l, y5 - w);
}

module set_plate() {
    plate_w_x = padding_x_l + w / 2 + 8 * w + padding_x_r;
    plate_w_y = padding_y_t + w / 2 + 4.5 * w + padding_y_b;
    plate_h = 4;

    translate([-plate_w_x + w / 2 + padding_x_r, -plate_w_y + padding_y_t + w / 2, -plate_h]) {
        cube([plate_w_x, plate_w_y, plate_h], center = false);
    }
}

module set_key_switches() {
    // row 1
    y1 = 0;
    for (i = [0:7]) {
        key_switch(-i * w, y1);
    }

    // row 2
    y2 = -w;
    key_switch(-0.25 * w, y2);
    for (i = [0:6]) {
        key_switch(-(1.5 + i) * w, y2);
    }

    // row 3
    y3 = -2 * w;
    key_switch(-0.625 * w, y3);
    for (i = [0:5]) {
        key_switch(-(2.25 + i) * w, y3);
    }

    // row 4
    y4 = -3 * w;
    key_switch(0, y4);
    key_switch(-1.375 * w, y4);
    for (i = [0:4]) {
        key_switch(-(2.75 + i) * w, y4);
    }
    
    // row 5
    y5 = -4 * w;
    key_switch(-2.5 * w, y5);
    key_switch(-3.75 * w, y5);
    key_switch(-5 * w, y5);
    key_switch(-6.375 * w, y5);
}


module unit_cube(x, y) {
    translate([x, y, 0]) {
        cube([w, w, w], center = true);
    }
}
